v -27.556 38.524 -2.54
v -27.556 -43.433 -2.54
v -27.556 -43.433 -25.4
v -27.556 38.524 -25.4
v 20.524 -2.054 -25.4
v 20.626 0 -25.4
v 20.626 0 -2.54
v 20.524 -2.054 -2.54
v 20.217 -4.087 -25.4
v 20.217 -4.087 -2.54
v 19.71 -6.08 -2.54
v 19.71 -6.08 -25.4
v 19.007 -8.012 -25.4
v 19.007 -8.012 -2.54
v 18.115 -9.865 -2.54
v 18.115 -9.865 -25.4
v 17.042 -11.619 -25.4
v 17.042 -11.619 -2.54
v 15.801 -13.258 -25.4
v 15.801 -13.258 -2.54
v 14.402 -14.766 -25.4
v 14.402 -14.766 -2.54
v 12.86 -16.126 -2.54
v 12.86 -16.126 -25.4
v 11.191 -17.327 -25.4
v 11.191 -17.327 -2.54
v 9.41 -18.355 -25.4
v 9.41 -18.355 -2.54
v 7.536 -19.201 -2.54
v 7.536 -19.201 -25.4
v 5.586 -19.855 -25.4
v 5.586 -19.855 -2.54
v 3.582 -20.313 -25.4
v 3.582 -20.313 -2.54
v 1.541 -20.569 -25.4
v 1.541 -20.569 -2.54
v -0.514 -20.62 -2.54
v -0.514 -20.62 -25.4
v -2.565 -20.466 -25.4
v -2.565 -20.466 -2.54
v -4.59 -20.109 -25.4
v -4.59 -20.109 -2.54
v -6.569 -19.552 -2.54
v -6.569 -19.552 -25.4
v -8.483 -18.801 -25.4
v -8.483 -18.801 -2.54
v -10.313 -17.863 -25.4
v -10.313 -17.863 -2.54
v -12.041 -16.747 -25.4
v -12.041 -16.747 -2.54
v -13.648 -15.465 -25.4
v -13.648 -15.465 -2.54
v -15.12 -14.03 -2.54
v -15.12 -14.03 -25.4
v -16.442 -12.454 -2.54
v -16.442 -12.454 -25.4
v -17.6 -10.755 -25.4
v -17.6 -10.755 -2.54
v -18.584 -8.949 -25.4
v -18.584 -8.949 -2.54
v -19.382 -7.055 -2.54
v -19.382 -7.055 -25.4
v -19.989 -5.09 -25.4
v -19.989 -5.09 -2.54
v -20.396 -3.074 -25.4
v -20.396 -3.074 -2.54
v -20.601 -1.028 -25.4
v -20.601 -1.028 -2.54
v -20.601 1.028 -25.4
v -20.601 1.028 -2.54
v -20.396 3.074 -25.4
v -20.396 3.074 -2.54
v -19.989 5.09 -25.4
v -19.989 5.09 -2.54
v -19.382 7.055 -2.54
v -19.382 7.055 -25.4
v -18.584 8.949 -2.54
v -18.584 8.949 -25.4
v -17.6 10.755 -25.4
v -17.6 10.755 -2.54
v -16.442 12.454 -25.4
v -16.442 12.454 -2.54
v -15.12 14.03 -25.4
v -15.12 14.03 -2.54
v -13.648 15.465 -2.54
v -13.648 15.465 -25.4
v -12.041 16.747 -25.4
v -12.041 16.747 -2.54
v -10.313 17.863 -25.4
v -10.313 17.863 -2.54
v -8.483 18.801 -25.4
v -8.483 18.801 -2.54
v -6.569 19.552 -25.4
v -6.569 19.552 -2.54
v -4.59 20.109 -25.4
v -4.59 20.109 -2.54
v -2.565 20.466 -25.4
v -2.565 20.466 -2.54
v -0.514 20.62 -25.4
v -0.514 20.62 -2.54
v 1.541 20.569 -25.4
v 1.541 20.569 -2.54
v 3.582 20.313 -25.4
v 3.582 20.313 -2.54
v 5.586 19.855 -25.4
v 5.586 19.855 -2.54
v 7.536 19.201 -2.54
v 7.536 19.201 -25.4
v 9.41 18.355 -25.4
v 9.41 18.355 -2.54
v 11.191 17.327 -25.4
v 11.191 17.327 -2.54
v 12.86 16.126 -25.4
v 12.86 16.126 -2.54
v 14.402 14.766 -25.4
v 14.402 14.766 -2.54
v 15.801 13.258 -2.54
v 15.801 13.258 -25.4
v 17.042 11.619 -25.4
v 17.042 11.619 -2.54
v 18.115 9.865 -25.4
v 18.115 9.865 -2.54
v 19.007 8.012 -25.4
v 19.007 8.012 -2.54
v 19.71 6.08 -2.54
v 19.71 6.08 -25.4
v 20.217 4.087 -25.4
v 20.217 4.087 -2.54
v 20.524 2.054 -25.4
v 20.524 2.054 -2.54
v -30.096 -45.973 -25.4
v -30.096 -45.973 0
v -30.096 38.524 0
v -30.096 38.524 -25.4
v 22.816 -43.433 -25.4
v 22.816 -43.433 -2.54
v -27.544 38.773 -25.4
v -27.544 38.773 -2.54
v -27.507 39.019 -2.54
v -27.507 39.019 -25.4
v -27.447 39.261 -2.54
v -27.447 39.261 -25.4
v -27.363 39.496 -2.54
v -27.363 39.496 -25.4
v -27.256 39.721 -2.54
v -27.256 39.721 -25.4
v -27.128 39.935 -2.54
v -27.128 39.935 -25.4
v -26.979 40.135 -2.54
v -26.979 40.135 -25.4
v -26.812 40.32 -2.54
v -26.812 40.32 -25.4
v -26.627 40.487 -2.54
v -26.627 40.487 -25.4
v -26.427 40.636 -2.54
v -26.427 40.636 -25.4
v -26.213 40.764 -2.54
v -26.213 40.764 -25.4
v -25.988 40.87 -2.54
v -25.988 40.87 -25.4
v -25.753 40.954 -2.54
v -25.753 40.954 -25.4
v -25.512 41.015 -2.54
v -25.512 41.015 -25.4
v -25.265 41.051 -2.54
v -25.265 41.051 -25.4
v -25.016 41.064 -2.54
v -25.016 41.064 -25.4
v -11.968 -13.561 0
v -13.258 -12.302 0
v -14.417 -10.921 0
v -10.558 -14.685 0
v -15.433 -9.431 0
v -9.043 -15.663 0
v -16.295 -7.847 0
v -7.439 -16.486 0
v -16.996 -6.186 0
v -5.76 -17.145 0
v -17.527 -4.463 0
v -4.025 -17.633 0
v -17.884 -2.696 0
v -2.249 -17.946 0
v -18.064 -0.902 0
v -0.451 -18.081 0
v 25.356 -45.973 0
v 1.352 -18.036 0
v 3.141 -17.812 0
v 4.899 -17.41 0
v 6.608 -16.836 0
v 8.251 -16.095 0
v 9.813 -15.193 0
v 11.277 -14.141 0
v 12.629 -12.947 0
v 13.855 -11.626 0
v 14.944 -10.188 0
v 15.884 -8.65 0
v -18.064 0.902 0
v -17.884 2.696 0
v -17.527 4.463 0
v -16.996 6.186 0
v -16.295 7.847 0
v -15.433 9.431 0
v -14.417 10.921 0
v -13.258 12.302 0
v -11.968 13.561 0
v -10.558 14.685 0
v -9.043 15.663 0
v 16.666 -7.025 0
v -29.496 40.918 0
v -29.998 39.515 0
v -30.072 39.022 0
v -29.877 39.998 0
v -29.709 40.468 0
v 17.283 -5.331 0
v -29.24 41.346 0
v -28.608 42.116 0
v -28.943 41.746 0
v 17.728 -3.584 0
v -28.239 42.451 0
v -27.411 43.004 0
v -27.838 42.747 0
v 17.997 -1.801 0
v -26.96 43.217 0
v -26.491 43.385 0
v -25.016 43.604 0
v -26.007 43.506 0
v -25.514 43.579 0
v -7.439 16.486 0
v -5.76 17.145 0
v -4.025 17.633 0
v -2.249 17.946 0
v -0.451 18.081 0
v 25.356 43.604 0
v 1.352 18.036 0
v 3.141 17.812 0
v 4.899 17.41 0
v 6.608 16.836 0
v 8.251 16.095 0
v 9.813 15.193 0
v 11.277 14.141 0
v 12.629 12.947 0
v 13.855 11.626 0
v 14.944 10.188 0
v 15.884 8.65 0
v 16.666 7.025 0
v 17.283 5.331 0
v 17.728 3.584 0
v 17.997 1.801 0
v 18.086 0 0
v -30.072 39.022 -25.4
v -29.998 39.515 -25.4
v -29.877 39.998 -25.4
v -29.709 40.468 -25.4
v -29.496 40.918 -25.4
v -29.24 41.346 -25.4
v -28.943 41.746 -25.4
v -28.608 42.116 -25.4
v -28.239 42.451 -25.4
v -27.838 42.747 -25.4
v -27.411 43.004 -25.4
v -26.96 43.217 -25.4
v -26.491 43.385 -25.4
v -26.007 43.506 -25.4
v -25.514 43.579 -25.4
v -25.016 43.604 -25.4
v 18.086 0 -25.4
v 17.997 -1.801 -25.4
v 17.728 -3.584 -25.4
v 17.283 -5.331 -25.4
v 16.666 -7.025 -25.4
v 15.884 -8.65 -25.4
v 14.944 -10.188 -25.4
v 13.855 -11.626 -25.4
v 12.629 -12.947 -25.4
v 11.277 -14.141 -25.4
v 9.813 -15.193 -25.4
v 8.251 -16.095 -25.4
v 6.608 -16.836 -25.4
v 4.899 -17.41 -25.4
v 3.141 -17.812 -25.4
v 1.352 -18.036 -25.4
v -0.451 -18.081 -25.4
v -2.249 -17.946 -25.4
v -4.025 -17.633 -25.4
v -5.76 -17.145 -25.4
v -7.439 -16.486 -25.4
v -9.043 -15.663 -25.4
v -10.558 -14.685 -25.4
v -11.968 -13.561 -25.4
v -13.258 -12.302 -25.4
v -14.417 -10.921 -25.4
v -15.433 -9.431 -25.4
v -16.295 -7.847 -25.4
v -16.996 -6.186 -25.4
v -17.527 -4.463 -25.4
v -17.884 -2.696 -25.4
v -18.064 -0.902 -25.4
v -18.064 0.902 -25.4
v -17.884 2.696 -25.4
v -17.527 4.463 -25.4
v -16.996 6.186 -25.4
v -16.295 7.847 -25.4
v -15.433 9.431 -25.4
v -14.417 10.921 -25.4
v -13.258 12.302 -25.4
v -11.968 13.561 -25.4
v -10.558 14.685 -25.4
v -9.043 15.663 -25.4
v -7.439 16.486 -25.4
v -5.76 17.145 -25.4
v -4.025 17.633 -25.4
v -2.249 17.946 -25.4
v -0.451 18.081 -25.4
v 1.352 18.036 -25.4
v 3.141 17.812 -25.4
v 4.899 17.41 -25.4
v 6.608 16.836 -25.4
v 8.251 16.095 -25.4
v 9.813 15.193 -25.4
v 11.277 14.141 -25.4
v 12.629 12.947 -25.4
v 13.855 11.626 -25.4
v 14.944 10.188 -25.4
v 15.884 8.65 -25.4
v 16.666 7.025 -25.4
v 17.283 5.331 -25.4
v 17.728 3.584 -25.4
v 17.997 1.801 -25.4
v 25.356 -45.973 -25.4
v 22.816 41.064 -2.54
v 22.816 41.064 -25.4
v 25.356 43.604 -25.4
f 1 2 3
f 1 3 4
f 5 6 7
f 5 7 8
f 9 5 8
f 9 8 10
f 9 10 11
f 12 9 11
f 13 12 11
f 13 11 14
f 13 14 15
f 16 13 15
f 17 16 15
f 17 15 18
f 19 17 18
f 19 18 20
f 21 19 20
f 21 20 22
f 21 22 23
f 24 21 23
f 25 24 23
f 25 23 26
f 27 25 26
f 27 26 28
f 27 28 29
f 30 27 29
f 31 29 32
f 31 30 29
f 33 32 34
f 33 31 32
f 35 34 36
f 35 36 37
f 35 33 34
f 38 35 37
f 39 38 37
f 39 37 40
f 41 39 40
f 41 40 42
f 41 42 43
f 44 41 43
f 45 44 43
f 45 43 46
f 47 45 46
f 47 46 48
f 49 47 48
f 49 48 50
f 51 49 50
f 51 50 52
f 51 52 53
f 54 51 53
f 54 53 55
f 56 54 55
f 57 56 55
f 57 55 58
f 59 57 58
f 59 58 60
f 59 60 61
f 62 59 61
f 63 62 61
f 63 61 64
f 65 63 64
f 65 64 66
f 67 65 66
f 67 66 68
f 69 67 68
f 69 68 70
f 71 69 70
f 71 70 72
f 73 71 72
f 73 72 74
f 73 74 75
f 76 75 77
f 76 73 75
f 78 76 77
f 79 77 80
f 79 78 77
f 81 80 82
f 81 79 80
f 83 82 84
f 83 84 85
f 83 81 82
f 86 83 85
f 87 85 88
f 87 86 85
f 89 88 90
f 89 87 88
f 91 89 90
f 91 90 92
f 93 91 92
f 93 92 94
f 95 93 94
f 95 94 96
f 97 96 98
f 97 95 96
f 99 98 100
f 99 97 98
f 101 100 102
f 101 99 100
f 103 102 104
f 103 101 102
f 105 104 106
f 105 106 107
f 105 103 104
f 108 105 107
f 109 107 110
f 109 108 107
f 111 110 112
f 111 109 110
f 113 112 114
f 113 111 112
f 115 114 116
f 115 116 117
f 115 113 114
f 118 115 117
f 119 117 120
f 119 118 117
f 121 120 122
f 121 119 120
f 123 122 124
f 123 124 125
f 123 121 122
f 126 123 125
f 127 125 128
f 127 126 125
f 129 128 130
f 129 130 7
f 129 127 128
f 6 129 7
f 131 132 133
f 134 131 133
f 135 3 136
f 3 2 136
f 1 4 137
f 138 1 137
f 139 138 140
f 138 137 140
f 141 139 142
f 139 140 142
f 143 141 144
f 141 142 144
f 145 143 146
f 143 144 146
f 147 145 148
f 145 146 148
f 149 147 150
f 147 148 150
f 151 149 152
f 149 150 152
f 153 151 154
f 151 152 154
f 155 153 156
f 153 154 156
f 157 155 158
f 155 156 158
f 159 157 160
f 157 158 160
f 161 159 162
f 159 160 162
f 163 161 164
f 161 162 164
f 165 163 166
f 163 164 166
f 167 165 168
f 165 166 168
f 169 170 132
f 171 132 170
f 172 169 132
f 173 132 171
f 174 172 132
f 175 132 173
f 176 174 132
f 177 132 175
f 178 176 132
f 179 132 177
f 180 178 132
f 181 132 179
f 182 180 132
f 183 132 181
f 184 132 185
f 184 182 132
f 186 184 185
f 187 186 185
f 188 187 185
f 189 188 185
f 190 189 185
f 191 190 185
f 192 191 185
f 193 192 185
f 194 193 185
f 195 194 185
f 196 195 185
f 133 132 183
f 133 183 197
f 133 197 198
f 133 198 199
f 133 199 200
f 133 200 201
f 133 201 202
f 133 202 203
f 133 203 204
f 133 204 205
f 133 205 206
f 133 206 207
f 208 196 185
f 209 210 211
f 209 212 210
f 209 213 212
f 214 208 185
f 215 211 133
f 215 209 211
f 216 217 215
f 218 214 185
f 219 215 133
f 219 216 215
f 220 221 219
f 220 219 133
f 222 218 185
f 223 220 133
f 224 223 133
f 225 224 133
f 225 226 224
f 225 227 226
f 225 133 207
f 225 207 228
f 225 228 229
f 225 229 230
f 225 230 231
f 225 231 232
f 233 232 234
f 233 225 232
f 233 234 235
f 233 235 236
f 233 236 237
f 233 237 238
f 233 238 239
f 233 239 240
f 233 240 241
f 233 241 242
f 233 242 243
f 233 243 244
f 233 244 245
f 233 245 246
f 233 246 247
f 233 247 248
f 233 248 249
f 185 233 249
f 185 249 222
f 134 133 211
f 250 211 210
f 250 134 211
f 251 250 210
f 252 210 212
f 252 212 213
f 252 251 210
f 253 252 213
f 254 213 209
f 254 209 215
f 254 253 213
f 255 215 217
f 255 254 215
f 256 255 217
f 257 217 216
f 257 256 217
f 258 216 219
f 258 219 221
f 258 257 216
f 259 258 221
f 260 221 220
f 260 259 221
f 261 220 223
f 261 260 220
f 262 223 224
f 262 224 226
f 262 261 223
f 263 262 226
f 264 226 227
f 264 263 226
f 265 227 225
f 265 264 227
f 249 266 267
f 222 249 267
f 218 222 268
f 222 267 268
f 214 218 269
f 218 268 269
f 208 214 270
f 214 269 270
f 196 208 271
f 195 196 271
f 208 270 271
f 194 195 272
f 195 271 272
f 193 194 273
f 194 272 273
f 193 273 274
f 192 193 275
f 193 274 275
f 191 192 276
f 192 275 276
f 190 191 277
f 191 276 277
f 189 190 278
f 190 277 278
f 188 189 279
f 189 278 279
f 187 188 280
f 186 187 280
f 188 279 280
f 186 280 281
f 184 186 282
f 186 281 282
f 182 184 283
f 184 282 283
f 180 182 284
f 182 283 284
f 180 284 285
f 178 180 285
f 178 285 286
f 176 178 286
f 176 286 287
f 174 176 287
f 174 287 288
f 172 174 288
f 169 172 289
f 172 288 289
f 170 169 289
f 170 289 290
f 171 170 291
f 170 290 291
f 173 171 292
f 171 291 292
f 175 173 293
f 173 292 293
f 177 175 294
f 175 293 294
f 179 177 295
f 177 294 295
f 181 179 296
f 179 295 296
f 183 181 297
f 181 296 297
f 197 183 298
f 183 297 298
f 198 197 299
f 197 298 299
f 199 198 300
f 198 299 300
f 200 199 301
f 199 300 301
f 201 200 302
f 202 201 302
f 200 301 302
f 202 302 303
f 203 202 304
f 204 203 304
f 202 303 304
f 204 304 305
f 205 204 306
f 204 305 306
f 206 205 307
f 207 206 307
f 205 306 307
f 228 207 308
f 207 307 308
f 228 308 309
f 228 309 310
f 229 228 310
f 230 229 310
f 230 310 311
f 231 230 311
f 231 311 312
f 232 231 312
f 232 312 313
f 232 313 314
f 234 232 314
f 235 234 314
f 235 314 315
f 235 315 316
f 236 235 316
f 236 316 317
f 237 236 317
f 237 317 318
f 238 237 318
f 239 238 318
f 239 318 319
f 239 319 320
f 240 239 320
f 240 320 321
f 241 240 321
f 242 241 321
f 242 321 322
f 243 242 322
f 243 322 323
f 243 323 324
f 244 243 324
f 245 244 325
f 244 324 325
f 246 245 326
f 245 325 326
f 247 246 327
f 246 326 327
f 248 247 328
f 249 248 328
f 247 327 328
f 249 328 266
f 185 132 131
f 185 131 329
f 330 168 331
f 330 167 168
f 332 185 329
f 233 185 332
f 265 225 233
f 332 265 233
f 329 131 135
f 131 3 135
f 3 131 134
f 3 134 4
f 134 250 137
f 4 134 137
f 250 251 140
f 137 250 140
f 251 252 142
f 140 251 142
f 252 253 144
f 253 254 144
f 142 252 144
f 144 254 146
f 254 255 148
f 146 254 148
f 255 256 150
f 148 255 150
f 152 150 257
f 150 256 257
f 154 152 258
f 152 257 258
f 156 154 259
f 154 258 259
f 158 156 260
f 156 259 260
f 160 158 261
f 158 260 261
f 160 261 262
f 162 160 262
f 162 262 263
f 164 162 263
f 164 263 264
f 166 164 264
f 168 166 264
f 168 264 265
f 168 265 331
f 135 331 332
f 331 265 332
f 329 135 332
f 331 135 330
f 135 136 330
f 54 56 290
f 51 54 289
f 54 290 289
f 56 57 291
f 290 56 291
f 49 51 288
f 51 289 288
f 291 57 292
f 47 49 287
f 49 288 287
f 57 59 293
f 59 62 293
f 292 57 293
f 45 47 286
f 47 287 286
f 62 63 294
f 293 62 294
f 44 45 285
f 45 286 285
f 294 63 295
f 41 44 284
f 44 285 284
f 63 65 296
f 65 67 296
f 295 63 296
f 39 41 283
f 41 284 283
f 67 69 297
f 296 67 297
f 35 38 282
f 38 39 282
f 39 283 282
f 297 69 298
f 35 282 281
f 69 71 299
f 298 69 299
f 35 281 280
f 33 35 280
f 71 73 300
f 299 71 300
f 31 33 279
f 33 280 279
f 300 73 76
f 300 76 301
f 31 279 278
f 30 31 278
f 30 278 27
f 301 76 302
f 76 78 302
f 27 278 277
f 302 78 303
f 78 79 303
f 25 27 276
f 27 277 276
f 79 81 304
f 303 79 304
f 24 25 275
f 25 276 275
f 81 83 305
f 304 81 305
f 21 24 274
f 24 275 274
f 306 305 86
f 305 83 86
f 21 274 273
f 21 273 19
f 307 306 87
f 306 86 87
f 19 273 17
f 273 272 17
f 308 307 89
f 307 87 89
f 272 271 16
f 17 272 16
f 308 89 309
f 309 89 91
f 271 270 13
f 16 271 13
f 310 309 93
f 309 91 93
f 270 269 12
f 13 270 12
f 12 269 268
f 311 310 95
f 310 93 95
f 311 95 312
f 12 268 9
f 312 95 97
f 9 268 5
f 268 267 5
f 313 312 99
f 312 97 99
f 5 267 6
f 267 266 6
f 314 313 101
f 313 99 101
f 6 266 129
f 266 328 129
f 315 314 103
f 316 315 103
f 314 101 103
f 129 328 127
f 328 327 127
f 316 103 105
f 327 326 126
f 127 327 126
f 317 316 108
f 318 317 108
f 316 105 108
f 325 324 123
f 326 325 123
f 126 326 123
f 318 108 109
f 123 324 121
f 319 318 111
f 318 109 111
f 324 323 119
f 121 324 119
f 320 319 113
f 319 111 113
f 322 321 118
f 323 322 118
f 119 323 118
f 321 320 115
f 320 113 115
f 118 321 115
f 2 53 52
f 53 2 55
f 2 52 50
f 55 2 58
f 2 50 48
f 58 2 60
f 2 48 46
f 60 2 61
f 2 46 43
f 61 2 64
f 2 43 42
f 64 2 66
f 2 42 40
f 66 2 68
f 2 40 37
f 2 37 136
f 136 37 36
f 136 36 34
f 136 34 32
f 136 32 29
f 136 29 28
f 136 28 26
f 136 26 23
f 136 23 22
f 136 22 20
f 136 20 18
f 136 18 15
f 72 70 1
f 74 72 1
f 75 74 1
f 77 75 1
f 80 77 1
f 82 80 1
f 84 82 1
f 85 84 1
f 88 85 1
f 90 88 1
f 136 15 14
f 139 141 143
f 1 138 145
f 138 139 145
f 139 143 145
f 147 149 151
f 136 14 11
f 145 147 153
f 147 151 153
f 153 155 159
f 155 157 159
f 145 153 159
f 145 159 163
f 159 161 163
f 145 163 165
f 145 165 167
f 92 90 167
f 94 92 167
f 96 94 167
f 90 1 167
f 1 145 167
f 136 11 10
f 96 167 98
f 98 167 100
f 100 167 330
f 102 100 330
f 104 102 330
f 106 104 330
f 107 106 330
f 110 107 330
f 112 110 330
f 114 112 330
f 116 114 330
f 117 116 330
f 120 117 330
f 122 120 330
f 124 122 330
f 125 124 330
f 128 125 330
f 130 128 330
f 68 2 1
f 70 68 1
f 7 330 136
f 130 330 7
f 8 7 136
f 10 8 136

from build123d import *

# Parameters (mm, degrees)
F0_W     = 55.4524268955
F0_H     = 89.5769931376
F1_DEPTH = 25.4
F2_R     = 5.08
F3_R     = 18.0864233447
F4_DEPTH = 25.4
F5_T     = -2.54


with BuildPart() as f1:
    # F0 (on Top) → F1 (new body)
    with BuildSketch(Plane.XY):
        with Locations((-2.3697623983, -1.1848751456)):
            Rectangle(F0_W, F0_H)
    extrude(amount=-F1_DEPTH)

    # F2
    f2_edges = [f1.edges().sort_by_distance(p)[0] for p in [
        (-30.095976, 43.603621, -12.7),
    ]]
    fillet(f2_edges, radius=F2_R)

    # F3 (on face) → F4 (cut)
    with BuildSketch(Plane(origin=(0, 0, -25.4), x_dir=(1, 0, 0), z_dir=(0, 0, -1))):
        Circle(F3_R)
    extrude(amount=-F4_DEPTH, mode=Mode.SUBTRACT)

    # F5
    f5_openings = [f1.faces().sort_by_distance(p)[0] for p in [
        (0.170238, 42.550103, -25.4),
    ]]
    offset(amount=F5_T, openings=f5_openings)


solid = f1.part
